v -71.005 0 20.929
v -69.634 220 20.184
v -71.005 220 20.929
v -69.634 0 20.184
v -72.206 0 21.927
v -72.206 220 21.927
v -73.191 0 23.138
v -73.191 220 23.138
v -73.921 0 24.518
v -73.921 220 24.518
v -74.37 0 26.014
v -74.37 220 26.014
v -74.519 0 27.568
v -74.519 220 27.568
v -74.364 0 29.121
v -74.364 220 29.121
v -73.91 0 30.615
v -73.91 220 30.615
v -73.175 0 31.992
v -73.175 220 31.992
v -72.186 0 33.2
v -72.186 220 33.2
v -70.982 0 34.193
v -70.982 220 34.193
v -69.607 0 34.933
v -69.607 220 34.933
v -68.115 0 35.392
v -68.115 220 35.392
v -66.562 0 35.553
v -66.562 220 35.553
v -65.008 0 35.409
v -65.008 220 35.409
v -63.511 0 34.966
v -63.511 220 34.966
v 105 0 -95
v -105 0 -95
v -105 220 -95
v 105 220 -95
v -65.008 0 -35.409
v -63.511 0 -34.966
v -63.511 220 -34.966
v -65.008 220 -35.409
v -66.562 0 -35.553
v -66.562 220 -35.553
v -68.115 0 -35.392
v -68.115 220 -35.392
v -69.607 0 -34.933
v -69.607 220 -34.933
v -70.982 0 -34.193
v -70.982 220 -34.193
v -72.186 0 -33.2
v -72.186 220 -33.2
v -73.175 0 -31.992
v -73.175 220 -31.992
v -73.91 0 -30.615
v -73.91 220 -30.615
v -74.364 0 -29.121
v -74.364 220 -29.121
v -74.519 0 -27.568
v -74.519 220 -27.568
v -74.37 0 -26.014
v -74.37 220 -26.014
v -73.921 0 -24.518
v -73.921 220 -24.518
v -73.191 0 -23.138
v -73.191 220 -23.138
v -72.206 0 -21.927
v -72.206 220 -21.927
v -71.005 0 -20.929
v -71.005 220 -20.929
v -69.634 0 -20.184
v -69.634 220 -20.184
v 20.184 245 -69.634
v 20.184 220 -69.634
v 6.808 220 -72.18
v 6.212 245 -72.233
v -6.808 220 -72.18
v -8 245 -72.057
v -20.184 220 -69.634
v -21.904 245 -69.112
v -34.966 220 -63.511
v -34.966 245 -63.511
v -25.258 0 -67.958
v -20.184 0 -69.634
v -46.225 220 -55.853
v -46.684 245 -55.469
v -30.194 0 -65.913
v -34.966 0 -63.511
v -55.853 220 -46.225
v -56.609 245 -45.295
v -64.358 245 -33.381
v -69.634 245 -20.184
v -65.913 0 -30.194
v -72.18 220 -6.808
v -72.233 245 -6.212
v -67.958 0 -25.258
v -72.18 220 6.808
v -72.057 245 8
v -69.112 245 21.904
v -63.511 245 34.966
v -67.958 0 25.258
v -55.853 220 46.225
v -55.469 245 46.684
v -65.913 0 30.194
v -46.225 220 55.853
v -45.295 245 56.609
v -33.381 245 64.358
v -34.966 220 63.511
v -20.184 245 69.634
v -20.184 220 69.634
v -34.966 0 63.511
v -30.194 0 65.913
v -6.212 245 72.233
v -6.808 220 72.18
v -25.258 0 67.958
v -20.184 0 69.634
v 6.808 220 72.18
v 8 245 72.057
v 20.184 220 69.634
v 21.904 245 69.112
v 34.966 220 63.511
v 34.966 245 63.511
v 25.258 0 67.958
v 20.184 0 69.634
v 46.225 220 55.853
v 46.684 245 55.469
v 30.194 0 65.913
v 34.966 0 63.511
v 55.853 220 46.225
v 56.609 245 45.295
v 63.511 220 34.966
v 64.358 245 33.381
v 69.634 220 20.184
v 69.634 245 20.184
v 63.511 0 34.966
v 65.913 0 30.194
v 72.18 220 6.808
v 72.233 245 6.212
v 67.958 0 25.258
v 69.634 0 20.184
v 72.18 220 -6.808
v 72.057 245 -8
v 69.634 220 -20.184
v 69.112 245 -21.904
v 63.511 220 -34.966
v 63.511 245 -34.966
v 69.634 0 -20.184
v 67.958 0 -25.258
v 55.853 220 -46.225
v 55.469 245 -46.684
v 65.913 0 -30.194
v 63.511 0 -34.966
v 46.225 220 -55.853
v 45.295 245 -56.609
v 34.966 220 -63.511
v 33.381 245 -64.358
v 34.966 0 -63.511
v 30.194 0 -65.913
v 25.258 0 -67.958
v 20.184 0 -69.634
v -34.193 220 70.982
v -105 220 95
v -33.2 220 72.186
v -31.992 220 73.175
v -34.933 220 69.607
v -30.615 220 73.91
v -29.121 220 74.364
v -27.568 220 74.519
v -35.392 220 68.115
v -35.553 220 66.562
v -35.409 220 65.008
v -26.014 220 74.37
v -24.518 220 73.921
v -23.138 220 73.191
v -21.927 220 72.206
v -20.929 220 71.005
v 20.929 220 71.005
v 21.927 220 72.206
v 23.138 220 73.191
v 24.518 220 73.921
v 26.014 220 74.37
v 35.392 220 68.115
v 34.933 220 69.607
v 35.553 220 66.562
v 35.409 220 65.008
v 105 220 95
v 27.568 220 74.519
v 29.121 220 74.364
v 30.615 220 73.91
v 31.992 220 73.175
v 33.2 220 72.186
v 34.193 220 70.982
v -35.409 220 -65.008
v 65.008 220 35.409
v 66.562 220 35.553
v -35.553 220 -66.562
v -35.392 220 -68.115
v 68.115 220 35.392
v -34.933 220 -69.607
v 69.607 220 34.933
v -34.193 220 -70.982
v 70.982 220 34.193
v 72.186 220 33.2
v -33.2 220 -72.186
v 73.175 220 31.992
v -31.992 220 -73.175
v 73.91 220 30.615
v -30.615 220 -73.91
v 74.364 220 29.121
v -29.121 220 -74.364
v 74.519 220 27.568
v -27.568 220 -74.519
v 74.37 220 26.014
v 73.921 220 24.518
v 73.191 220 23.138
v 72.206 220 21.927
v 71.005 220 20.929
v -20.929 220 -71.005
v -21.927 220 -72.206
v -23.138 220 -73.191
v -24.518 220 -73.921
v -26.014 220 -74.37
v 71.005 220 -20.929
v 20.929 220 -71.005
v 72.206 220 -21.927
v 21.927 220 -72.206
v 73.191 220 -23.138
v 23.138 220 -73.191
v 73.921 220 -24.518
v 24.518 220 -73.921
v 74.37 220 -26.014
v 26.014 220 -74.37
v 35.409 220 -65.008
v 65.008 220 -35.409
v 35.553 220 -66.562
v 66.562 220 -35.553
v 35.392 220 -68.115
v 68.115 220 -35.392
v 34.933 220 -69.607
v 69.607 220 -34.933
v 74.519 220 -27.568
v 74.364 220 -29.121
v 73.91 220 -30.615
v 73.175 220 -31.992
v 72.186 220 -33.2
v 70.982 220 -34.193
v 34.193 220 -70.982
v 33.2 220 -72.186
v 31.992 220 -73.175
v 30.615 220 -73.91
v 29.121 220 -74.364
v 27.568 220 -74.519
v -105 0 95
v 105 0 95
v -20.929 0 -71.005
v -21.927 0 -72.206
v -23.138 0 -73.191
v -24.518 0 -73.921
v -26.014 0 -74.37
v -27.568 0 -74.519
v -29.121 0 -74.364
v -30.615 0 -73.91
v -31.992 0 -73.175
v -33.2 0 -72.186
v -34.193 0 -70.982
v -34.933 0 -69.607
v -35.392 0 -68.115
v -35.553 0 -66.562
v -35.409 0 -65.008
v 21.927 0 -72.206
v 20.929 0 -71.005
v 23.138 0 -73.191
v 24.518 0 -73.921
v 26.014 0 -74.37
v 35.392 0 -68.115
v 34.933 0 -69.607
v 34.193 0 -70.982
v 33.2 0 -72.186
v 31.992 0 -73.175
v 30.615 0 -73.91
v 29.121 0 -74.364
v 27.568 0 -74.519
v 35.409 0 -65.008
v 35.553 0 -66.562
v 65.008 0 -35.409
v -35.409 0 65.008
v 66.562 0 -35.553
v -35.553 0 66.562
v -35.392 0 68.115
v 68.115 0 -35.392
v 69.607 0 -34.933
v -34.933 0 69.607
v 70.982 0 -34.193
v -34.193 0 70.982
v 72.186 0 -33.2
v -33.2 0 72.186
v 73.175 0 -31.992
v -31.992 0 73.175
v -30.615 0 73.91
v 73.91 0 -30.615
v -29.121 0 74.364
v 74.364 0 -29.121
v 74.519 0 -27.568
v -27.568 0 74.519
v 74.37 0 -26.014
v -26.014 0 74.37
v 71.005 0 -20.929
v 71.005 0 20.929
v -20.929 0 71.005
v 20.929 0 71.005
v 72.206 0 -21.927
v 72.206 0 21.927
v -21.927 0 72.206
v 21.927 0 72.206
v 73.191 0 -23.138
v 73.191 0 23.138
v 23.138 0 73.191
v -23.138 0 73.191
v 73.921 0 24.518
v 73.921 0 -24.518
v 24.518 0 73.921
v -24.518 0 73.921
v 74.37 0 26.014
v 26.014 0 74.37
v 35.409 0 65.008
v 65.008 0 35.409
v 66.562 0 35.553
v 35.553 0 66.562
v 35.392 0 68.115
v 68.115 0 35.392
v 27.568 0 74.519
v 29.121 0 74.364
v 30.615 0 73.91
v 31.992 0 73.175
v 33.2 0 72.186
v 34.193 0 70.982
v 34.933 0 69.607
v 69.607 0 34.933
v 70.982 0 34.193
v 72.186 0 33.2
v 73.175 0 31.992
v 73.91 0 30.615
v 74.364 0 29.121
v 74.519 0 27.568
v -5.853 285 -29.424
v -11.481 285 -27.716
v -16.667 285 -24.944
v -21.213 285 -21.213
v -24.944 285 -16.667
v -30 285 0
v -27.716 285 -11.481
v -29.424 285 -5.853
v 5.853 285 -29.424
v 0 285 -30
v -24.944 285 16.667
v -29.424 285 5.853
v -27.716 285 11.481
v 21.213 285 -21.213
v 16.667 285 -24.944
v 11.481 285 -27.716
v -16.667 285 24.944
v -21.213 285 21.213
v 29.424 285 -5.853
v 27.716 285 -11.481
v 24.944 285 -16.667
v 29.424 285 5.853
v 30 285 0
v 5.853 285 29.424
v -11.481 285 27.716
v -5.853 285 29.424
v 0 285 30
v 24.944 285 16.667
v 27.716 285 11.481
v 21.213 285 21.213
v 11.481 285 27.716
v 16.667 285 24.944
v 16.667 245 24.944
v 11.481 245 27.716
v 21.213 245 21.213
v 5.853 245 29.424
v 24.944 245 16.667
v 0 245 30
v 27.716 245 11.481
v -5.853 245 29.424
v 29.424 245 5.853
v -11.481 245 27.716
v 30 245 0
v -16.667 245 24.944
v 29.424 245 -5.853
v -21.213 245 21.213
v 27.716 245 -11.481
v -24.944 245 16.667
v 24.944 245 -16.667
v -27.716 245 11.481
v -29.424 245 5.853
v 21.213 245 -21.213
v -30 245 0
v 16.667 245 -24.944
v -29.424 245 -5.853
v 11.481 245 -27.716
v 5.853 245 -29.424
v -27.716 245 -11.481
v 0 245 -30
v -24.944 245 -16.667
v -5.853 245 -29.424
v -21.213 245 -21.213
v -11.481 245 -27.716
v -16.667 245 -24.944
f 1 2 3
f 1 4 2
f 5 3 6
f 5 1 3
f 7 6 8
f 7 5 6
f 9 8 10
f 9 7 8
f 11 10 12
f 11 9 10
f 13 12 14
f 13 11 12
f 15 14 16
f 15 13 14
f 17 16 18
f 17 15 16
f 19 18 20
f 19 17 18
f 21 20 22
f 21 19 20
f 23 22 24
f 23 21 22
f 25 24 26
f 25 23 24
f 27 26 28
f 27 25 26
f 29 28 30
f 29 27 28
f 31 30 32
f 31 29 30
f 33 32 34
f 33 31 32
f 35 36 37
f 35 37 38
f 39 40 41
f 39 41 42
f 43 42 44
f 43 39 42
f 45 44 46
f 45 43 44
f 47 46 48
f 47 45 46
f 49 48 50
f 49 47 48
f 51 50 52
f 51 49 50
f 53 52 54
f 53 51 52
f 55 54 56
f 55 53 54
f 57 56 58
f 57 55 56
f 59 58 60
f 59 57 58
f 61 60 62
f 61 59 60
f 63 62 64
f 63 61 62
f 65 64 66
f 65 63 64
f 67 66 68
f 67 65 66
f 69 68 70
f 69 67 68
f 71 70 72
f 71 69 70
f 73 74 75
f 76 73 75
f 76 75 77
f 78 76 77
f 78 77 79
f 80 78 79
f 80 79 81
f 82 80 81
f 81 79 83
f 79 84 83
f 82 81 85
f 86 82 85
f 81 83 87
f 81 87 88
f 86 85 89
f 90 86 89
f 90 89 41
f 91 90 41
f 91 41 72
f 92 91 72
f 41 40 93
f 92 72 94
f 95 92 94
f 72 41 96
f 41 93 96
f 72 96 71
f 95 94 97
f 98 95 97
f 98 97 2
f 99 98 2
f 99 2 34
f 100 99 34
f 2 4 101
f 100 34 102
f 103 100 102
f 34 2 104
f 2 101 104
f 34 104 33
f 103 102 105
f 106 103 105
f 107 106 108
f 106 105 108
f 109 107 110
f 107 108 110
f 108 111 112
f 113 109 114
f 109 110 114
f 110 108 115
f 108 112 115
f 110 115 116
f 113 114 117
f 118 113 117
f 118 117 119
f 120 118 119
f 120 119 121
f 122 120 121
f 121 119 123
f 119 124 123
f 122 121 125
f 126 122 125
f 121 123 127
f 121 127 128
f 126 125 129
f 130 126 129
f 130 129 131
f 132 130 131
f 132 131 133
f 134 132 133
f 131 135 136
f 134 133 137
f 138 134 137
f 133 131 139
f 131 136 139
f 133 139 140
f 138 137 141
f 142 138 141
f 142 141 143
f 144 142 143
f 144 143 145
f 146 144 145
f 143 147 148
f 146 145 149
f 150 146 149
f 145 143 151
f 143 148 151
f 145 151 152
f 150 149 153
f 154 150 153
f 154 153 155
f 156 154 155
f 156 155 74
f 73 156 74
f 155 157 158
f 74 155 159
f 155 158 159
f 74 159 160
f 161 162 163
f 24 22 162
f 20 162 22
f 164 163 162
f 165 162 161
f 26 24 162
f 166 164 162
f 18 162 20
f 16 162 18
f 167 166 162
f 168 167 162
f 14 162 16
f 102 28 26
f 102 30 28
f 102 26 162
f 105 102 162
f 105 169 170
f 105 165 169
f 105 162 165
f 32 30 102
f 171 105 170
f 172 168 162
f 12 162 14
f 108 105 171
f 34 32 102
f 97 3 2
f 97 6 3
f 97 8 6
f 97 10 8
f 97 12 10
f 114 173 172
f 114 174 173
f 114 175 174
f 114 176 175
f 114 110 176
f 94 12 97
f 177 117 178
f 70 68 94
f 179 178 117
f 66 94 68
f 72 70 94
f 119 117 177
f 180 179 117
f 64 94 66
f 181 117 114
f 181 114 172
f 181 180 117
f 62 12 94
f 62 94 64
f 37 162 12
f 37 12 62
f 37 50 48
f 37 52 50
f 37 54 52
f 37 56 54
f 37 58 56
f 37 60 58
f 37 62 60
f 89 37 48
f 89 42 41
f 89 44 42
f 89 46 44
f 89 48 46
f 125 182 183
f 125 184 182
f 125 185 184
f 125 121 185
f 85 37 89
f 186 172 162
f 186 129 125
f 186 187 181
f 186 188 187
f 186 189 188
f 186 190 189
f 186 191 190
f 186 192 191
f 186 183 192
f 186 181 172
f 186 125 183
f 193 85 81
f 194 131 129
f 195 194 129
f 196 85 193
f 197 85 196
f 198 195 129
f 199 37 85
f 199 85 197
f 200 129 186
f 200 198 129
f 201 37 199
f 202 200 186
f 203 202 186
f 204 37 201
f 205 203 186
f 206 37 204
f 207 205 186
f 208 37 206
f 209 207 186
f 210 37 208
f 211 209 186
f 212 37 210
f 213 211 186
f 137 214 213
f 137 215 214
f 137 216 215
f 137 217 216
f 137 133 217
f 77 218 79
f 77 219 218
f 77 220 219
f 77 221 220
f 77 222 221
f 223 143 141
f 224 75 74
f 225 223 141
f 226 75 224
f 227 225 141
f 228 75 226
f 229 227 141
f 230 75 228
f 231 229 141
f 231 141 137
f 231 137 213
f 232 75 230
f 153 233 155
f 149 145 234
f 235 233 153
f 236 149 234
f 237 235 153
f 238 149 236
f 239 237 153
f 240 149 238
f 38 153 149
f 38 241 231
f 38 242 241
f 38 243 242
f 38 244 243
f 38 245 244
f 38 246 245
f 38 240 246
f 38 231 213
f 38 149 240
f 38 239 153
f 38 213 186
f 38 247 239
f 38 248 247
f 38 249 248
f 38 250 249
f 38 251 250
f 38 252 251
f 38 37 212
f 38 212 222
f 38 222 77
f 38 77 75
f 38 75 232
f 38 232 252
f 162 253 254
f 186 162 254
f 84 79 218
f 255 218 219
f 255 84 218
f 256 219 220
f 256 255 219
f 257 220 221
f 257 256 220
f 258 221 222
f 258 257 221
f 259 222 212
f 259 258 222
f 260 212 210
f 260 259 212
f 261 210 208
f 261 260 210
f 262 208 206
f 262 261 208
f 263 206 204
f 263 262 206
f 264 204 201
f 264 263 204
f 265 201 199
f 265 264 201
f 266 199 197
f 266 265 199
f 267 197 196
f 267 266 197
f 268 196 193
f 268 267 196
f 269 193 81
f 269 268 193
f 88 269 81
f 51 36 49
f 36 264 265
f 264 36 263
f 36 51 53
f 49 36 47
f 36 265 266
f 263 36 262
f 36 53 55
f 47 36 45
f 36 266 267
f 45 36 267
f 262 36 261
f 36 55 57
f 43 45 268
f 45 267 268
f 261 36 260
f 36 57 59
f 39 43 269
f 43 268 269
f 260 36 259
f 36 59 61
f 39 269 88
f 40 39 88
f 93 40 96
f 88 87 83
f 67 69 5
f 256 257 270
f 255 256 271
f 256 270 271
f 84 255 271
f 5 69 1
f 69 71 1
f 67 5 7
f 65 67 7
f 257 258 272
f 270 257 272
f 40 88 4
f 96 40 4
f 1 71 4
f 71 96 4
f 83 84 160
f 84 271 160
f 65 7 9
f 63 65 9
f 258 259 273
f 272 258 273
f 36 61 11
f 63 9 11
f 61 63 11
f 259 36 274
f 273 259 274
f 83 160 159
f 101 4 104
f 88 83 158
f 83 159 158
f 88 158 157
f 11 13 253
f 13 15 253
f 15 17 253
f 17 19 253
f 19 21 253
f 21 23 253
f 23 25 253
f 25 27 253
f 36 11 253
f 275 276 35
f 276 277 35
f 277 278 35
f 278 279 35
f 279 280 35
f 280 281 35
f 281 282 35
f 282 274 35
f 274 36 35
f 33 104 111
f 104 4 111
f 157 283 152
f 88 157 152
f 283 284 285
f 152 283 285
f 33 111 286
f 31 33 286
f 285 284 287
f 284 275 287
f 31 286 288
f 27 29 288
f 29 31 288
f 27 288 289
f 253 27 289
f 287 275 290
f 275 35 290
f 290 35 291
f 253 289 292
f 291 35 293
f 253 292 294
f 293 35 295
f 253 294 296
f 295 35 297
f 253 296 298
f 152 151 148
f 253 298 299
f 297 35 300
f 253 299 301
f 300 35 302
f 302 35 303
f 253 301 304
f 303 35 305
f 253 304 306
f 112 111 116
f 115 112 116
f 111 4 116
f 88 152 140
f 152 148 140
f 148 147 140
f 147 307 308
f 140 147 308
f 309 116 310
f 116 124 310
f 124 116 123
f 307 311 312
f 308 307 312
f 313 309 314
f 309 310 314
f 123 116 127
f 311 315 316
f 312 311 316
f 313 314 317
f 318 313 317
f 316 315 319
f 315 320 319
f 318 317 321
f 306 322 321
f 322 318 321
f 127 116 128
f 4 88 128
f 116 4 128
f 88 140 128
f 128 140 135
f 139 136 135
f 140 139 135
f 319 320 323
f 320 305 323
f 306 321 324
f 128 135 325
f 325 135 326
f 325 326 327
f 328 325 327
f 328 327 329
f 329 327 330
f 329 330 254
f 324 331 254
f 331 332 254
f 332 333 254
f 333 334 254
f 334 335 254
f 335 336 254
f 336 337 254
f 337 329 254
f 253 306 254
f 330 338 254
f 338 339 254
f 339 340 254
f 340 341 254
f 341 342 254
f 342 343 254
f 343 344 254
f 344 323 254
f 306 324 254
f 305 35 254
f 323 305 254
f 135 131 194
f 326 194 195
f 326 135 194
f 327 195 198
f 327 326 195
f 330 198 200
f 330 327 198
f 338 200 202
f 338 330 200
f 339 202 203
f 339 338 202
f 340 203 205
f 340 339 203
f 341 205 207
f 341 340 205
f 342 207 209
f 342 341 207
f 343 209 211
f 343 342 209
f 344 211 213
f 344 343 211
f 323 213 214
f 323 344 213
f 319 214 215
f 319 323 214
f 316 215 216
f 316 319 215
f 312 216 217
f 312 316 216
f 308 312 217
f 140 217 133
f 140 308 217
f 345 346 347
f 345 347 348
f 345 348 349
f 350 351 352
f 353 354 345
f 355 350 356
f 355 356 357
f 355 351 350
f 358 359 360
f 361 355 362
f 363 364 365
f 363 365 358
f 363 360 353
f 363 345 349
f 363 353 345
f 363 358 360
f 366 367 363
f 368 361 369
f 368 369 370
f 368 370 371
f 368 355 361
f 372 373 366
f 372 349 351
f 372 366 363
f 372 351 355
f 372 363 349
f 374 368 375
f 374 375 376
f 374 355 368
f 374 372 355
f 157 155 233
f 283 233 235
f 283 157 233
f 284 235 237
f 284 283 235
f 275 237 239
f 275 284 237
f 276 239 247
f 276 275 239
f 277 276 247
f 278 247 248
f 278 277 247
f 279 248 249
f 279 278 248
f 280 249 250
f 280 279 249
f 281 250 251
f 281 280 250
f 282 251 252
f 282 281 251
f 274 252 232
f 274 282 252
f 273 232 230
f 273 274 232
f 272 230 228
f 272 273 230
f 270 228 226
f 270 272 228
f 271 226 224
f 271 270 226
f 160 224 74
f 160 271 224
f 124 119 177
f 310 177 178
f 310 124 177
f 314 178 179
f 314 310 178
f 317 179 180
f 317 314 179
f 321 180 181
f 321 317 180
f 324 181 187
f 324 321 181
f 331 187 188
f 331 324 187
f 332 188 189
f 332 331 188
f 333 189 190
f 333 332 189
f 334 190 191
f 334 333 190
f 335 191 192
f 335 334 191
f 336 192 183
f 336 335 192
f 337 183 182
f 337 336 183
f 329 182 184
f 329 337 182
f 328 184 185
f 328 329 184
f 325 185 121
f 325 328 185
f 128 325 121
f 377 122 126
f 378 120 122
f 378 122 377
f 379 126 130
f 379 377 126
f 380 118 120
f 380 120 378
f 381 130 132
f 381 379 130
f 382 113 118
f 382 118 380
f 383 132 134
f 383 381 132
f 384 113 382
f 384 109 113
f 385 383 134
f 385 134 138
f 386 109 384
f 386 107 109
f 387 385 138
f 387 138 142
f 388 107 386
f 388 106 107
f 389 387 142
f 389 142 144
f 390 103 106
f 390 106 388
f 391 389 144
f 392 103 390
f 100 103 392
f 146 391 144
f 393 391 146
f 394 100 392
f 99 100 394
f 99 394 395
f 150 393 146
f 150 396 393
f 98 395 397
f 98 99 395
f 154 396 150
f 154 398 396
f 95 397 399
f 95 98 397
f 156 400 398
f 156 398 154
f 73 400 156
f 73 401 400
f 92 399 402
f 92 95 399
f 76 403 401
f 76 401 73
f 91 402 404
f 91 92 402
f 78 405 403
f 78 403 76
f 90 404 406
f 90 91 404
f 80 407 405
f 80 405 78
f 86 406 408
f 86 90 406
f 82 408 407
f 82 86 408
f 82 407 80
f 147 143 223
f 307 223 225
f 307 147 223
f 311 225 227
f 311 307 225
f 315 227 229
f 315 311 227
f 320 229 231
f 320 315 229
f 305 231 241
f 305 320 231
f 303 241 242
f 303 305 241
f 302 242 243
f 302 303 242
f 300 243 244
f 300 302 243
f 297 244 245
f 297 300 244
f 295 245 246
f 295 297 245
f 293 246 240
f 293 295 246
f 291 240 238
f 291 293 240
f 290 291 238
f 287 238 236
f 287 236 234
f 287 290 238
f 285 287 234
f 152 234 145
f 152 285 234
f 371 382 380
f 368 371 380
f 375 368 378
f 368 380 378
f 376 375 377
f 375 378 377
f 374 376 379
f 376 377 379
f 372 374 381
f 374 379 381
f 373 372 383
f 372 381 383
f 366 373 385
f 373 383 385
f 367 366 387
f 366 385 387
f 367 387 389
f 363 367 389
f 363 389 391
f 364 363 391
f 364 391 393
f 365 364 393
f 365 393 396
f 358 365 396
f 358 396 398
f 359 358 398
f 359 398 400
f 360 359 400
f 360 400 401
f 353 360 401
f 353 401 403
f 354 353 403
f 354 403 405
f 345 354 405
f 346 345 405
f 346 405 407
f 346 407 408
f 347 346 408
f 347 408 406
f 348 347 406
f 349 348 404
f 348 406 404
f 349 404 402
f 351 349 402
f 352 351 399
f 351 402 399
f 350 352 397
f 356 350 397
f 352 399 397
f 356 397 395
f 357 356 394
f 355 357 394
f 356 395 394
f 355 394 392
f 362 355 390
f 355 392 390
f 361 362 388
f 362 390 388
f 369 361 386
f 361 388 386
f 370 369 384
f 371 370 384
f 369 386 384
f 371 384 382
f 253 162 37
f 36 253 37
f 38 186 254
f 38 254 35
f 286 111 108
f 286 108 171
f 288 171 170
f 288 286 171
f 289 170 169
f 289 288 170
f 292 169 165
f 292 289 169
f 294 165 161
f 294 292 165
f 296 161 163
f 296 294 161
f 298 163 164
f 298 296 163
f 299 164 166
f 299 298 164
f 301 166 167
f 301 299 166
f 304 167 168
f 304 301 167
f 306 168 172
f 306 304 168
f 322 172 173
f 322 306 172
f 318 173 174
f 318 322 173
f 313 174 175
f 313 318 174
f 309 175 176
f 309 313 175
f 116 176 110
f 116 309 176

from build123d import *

# Parameters (mm, degrees)
F_01_HOUSING_PROFILE_W        = 210
F_01_HOUSING_PROFILE_H        = 190
F_01_HOUSING_PROFILE_R        = 8
F_01_HOUSING_BLOCK_DEPTH      = 220
F_02_FACE_BOSS_PROFILE_R      = 72.5
F_02_FACE_LOCATING_BOSS_DEPTH = 245
F_03_OUTPUT_SHAFT_PROFILE_R   = 30
F_03_OUTPUT_SHAFT_DEPTH       = 285


with BuildPart() as part:
    # 01_Housing_Profile → 01_Housing_Block (new body)
    with BuildSketch(Plane(origin=(0, 0, 0), x_dir=(1, 0, 0), z_dir=(0, 1, 0))):
        Rectangle(F_01_HOUSING_PROFILE_W, F_01_HOUSING_PROFILE_H)
        with Locations(Location((66.519326341, 27.55320713, 0), (0, 0, 270))):
            Circle(F_01_HOUSING_PROFILE_R, mode=Mode.SUBTRACT)
        with Locations(Location((27.55320713, 66.519326341, 0), (0, 0, 270))):
            Circle(F_01_HOUSING_PROFILE_R, mode=Mode.SUBTRACT)
        with Locations(Location((-27.55320713, 66.519326341, 0), (0, 0, 270))):
            Circle(F_01_HOUSING_PROFILE_R, mode=Mode.SUBTRACT)
        with Locations(Location((-66.519326341, 27.55320713, 0), (0, 0, 270))):
            Circle(F_01_HOUSING_PROFILE_R, mode=Mode.SUBTRACT)
        with Locations(Location((-66.519326341, -27.55320713, 0), (0, 0, 270))):
            Circle(F_01_HOUSING_PROFILE_R, mode=Mode.SUBTRACT)
        with Locations(Location((-27.55320713, -66.519326341, 0), (0, 0, 270))):
            Circle(F_01_HOUSING_PROFILE_R, mode=Mode.SUBTRACT)
        with Locations(Location((27.55320713, -66.519326341, 0), (0, 0, 270))):
            Circle(F_01_HOUSING_PROFILE_R, mode=Mode.SUBTRACT)
        with Locations(Location((66.519326341, -27.55320713, 0), (0, 0, 270))):
            Circle(F_01_HOUSING_PROFILE_R, mode=Mode.SUBTRACT)
    extrude(amount=F_01_HOUSING_BLOCK_DEPTH)

    # 02_Face_Boss_Profile → 02_Face_Locating_Boss (add)
    with BuildSketch(Plane(origin=(0, 0, 0), x_dir=(1, 0, 0), z_dir=(0, 1, 0))):
        with Locations(Location((0, 0, 0), (0, 0, 73.835030621))):
            Circle(F_02_FACE_BOSS_PROFILE_R)
    extrude(amount=F_02_FACE_LOCATING_BOSS_DEPTH)

    # 03_Output_Shaft_Profile → 03_Output_Shaft (add)
    with BuildSketch(Plane(origin=(0, 0, 0), x_dir=(1, 0, 0), z_dir=(0, 1, 0))):
        with Locations(Location((0, 0, 0), (0, 0, 270))):
            Circle(F_03_OUTPUT_SHAFT_PROFILE_R)
    extrude(amount=F_03_OUTPUT_SHAFT_DEPTH)


solid = part.part
